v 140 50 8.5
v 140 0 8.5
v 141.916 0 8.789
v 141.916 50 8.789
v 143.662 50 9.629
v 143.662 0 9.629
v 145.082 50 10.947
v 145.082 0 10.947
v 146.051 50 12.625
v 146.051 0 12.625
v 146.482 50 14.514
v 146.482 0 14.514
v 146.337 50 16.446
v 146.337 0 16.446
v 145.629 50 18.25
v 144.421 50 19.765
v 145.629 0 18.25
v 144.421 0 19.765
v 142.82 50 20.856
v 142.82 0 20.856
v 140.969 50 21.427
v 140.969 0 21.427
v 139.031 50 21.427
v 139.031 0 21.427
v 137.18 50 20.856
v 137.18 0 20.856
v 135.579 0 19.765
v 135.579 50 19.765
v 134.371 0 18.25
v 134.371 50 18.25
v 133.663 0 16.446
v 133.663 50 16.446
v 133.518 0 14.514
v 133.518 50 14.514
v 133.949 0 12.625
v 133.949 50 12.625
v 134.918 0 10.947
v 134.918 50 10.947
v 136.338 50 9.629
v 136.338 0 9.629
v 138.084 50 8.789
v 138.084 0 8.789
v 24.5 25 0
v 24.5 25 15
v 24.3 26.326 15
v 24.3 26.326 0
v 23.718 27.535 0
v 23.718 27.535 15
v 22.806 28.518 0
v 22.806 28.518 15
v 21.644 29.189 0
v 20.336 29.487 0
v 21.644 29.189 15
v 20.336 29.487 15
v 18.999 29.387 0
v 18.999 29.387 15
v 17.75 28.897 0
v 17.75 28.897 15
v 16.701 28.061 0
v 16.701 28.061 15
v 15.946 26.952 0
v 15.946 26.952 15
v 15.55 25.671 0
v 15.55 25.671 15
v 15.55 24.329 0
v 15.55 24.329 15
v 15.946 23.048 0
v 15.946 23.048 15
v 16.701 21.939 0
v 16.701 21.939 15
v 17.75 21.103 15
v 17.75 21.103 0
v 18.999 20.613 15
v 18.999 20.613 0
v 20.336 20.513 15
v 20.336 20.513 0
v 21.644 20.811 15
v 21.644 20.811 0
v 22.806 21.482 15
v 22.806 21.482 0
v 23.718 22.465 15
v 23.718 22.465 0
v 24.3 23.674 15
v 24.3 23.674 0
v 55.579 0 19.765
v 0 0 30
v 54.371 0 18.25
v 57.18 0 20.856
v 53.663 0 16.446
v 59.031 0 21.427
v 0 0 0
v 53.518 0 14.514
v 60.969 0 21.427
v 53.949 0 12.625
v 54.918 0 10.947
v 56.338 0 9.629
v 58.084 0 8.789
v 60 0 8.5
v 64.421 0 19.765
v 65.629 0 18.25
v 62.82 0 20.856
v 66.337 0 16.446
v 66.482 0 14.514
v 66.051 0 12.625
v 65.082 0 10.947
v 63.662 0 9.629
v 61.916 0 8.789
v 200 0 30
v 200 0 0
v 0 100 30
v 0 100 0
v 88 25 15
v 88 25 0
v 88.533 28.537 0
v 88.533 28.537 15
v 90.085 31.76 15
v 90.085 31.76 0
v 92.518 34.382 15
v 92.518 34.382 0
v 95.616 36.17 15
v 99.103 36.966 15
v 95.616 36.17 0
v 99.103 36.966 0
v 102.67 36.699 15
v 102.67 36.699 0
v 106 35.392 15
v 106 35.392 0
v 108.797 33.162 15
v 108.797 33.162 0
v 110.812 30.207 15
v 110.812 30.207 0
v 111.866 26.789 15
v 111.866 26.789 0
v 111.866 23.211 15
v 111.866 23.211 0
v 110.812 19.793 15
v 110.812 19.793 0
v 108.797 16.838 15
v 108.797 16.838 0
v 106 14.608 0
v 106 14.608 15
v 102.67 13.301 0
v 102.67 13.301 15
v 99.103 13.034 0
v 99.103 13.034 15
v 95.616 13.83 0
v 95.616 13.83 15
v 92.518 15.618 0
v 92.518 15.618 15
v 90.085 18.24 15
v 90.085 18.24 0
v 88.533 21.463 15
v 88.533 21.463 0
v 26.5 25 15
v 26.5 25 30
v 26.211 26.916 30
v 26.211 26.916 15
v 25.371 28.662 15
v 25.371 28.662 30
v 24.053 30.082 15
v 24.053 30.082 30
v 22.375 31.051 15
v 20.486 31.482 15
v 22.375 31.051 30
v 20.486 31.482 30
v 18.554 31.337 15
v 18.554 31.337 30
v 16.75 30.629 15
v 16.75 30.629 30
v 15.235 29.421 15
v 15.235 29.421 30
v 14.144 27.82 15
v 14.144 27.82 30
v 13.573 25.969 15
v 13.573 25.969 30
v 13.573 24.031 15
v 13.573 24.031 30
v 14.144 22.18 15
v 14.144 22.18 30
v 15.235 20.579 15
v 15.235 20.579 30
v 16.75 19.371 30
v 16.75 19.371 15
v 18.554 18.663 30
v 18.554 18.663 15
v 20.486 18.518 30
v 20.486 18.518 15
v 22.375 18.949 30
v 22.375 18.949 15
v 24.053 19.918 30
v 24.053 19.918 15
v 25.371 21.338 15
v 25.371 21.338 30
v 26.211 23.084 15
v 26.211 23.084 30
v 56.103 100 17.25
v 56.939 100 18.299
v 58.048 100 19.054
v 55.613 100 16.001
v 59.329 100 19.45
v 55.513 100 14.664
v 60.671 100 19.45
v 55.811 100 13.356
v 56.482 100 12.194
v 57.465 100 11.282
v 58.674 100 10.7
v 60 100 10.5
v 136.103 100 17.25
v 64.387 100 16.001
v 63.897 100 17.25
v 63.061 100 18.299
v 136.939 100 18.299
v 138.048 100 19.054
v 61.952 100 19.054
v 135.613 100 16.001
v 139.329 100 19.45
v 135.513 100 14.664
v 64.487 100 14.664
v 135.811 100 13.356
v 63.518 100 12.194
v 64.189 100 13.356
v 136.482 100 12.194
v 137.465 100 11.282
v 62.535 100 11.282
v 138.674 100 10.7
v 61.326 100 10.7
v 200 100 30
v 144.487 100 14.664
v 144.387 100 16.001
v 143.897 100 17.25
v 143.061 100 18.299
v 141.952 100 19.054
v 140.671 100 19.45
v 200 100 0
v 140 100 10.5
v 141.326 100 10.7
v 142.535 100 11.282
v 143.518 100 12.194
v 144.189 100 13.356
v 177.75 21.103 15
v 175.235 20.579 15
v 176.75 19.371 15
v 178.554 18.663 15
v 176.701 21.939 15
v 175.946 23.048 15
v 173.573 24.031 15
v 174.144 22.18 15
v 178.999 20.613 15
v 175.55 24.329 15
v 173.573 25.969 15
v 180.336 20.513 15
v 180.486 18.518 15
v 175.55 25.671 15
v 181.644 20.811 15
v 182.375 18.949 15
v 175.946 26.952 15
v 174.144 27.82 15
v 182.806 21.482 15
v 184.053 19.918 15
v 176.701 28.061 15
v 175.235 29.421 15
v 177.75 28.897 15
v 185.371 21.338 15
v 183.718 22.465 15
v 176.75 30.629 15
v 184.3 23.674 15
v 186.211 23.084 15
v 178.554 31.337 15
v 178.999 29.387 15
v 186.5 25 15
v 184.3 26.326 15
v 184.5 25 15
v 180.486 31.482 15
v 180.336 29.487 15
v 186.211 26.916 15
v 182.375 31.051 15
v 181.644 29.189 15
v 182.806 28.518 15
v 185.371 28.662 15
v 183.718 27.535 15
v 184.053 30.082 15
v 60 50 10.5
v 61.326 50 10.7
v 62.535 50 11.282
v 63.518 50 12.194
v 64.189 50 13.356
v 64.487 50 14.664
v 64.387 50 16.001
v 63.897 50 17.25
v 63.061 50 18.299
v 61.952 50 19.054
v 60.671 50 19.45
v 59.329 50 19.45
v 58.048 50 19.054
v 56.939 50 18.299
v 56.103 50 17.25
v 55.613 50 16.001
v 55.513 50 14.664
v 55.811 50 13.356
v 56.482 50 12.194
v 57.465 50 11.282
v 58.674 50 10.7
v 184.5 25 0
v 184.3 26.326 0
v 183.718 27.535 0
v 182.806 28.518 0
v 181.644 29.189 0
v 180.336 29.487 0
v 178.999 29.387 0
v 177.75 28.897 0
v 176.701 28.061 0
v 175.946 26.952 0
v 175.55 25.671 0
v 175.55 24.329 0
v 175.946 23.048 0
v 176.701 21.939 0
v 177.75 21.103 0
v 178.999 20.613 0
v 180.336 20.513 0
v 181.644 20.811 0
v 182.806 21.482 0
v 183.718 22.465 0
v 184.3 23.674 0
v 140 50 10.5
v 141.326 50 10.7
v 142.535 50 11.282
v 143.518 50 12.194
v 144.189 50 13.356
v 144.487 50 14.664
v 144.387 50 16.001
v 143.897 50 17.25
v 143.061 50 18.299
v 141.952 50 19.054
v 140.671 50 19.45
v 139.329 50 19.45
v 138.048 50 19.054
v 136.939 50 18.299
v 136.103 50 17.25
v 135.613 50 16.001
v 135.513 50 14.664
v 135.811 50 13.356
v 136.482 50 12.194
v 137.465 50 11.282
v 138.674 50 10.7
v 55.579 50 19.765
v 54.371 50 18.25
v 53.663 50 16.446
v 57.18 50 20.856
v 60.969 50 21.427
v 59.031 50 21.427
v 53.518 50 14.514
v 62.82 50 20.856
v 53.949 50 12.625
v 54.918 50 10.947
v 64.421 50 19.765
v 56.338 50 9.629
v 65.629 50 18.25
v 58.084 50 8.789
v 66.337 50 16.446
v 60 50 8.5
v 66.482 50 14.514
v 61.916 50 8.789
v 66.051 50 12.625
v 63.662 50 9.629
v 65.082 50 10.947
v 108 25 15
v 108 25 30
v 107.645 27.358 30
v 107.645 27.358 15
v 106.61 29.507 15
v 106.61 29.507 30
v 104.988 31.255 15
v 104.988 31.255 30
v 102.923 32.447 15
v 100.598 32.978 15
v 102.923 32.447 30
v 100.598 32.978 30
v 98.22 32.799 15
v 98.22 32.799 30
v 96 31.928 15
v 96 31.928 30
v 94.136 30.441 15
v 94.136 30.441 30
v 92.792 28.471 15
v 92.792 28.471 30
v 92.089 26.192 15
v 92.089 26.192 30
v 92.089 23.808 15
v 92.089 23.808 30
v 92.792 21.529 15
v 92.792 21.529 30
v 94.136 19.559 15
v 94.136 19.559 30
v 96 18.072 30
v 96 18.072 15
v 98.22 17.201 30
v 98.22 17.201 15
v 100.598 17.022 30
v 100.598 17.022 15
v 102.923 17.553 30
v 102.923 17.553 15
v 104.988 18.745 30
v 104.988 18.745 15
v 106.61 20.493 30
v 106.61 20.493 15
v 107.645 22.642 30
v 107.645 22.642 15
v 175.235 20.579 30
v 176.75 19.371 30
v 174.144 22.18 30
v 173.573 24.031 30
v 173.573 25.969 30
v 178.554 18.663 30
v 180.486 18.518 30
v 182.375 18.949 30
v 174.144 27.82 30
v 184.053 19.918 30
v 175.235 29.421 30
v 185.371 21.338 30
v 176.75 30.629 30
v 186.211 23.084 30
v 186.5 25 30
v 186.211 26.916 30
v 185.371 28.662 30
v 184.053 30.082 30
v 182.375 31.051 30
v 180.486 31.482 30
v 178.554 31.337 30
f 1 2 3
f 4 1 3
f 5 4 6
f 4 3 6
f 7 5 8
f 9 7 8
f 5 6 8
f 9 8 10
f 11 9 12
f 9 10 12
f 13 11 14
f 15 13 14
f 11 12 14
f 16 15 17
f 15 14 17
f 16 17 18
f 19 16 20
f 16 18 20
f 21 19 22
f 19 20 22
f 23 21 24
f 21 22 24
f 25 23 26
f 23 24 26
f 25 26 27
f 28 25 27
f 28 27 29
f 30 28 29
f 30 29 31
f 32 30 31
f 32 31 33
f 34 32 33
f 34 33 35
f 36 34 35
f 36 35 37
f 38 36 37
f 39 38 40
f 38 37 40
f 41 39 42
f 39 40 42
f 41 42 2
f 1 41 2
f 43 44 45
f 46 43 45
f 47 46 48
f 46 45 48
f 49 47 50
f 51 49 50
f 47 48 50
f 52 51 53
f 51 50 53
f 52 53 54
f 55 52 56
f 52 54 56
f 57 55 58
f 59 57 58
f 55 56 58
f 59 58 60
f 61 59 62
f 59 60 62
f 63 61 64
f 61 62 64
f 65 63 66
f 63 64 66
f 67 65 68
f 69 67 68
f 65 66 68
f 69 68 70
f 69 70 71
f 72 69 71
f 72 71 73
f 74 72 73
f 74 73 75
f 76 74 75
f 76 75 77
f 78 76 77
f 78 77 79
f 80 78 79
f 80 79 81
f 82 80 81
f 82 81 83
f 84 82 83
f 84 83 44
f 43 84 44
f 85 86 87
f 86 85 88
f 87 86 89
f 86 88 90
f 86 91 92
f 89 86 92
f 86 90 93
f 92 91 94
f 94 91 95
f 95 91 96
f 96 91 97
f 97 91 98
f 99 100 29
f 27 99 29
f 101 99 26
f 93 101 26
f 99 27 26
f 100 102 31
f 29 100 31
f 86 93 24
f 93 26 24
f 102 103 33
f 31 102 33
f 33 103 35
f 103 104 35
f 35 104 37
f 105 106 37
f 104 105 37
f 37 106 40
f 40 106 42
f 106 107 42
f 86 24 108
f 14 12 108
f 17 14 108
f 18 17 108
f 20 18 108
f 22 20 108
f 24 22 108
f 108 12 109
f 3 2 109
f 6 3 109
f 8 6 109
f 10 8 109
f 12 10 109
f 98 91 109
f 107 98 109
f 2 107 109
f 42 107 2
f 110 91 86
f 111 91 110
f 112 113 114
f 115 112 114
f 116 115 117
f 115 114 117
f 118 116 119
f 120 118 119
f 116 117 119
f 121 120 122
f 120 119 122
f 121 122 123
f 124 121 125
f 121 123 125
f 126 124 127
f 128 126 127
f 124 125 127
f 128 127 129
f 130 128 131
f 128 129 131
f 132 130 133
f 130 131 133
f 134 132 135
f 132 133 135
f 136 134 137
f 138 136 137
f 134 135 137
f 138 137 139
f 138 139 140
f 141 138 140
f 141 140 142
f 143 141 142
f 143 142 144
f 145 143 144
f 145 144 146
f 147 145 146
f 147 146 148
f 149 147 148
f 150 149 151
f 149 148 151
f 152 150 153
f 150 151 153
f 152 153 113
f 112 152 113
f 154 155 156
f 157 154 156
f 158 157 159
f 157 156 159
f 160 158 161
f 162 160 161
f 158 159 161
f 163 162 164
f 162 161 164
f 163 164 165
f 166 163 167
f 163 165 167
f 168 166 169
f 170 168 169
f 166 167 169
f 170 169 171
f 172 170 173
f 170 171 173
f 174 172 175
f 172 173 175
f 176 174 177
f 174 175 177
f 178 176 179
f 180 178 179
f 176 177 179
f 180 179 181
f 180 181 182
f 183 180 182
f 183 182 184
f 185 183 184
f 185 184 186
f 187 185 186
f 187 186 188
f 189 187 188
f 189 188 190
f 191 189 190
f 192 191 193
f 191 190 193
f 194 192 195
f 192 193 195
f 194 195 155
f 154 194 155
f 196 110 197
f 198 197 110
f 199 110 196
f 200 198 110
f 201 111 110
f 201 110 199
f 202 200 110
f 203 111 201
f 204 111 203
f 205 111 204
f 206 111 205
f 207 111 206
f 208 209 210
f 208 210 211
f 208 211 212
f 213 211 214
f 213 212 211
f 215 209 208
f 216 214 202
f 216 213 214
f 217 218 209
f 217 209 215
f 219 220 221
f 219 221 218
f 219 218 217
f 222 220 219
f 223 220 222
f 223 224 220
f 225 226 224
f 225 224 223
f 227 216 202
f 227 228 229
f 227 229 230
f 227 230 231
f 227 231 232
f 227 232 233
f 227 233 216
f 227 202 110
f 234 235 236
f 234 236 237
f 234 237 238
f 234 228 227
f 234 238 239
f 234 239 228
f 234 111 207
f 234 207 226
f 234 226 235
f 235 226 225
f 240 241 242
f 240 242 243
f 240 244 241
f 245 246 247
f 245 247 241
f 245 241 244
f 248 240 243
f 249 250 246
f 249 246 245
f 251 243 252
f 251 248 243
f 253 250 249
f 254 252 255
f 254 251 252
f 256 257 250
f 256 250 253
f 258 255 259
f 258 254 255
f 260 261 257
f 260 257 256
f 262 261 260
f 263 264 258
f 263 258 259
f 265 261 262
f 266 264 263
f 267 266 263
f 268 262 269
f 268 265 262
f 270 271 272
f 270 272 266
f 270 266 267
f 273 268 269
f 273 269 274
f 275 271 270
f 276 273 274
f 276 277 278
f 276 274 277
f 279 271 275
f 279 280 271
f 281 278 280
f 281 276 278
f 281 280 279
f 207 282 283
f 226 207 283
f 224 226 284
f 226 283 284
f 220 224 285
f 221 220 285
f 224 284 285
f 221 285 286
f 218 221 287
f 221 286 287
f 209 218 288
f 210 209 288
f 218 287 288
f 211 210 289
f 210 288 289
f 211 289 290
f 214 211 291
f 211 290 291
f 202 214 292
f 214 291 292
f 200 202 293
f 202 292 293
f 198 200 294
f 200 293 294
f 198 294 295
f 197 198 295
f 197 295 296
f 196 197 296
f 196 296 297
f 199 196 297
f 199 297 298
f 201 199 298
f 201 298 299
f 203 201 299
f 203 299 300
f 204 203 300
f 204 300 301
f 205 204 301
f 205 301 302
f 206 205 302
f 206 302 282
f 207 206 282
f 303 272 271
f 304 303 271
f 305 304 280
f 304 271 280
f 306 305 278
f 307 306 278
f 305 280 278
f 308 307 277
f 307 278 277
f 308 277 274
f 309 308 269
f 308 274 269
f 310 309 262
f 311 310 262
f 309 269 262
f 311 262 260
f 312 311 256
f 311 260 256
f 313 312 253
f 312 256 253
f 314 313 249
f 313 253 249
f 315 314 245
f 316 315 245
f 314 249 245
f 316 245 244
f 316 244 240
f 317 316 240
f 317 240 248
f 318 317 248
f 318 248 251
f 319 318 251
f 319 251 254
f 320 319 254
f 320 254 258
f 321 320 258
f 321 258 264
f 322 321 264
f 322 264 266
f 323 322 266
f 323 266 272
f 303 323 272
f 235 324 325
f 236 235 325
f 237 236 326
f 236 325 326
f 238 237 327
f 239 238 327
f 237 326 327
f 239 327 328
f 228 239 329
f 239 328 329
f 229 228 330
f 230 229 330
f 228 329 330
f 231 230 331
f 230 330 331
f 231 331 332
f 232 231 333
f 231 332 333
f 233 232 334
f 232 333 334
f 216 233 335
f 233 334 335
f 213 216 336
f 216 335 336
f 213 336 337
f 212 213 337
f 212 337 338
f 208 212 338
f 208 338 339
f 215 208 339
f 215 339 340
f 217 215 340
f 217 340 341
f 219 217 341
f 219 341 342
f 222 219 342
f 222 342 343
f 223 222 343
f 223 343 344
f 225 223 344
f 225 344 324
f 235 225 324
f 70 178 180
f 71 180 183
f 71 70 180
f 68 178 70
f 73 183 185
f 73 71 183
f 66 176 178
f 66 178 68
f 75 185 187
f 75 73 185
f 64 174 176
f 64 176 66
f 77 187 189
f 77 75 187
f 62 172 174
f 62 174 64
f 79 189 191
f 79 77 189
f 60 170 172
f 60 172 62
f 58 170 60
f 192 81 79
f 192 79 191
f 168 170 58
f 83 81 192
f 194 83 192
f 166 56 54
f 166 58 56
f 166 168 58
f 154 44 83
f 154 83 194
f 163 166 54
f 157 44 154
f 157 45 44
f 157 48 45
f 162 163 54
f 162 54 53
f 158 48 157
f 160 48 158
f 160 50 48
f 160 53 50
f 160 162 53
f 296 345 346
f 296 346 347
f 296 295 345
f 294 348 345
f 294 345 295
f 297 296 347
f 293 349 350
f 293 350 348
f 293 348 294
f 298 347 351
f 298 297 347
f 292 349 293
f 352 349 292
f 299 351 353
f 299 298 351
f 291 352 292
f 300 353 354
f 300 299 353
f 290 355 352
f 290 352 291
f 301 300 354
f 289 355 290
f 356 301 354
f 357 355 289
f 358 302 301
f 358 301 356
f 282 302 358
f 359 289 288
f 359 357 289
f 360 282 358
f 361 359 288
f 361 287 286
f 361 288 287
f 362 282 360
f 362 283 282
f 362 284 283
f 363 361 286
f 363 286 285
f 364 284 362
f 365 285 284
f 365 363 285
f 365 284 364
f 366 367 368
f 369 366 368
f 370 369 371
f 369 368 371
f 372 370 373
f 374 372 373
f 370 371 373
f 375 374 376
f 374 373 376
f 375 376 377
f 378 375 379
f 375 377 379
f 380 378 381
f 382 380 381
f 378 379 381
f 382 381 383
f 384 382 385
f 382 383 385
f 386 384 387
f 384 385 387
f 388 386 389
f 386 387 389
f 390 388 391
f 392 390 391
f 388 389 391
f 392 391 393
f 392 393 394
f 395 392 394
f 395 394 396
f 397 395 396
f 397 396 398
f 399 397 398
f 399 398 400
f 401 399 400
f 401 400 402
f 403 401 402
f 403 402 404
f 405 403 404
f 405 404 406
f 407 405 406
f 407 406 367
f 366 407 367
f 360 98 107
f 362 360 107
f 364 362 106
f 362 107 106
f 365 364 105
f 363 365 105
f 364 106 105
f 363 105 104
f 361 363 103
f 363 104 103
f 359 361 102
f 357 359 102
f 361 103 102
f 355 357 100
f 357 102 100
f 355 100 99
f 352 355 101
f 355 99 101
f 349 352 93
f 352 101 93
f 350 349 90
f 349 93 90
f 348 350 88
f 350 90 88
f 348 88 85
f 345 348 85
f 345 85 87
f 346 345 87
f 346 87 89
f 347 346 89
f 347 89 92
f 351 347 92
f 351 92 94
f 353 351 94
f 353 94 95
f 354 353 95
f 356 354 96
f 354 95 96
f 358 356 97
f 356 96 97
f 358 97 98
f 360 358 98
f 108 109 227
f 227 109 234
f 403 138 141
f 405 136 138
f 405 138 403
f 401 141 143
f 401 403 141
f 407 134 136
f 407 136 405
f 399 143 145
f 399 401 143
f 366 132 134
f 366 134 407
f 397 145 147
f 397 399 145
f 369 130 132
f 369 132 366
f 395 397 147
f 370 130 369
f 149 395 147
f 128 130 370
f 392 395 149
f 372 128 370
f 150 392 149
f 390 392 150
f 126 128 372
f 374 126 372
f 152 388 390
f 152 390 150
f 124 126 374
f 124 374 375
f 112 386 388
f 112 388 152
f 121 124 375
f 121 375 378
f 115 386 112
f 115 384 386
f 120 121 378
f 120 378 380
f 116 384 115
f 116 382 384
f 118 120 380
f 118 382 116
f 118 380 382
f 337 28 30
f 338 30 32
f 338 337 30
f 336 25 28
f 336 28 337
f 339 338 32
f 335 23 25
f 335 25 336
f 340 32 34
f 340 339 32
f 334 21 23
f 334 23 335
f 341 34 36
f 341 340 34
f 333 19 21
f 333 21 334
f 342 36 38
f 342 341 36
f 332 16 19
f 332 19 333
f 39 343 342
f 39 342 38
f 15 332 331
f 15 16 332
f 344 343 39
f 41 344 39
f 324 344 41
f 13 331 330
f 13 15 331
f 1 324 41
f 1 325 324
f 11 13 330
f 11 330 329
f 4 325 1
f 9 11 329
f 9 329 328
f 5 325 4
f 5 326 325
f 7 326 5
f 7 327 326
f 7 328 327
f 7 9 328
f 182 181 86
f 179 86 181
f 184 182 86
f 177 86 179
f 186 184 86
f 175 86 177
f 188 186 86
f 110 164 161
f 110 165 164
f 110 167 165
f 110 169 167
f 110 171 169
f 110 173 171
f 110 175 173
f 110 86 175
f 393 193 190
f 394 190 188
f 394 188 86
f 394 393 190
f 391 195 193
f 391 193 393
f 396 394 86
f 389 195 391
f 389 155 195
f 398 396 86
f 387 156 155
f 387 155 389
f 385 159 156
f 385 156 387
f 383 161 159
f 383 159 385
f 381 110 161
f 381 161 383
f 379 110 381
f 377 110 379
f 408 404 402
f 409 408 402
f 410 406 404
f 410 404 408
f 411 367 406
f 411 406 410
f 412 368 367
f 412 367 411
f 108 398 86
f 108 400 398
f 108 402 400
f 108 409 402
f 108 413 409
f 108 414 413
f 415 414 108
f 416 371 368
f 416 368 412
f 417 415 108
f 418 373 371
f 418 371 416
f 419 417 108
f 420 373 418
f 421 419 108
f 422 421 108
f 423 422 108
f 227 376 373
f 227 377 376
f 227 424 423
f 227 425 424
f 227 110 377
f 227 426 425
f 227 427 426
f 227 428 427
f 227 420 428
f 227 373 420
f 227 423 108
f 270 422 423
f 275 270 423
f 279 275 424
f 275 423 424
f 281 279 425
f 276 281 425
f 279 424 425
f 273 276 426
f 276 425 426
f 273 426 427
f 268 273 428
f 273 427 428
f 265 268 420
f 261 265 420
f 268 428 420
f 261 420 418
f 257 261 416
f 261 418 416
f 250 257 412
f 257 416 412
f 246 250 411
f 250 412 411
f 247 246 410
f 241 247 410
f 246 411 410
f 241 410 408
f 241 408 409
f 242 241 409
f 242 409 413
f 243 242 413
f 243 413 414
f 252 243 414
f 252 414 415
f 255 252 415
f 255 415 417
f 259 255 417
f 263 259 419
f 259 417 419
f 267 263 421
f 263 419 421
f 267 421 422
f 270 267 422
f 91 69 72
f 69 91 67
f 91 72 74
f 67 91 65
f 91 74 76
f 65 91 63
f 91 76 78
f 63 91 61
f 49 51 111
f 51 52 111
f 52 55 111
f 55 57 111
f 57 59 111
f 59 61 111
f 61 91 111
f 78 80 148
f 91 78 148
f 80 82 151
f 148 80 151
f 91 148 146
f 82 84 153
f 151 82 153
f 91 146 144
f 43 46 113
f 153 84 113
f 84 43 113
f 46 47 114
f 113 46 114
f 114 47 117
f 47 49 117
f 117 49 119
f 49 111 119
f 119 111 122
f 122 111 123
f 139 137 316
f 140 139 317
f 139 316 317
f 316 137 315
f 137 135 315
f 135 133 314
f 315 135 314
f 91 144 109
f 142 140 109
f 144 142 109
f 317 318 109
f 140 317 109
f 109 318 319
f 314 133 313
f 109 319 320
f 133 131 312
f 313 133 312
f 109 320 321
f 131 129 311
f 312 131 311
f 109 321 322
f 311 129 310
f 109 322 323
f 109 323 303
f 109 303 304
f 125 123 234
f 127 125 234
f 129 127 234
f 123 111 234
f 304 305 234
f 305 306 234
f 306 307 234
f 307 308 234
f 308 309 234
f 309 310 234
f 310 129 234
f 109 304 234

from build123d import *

# Parameters (mm, degrees)
SKETCH_1_W          = 200
SKETCH_1_H          = 100
EXTRUDE_1_DEPTH     = 30
SKETCH_2_R          = 4.5
SKETCH_2_R_2        = 8
CUT_EXTRUDE_1_DEPTH = 226.610283454
SKETCH_3_R          = 4.5
CUT_EXTRUDE_2_DEPTH = 226.610283454
SKETCH_4_R          = 6.5
CUT_EXTRUDE_3_DEPTH = 50
SKETCH_5_R          = 6.5
CUT_EXTRUDE_4_DEPTH = 15
SKETCH_6_R          = 12
CUT_EXTRUDE_5_DEPTH = 15


with BuildPart() as part:
    # 草图1 → 凸台-拉伸1 (new body)
    with BuildSketch(Plane.XY):
        with Locations((100, 50)):
            Rectangle(SKETCH_1_W, SKETCH_1_H)
    extrude(amount=EXTRUDE_1_DEPTH)

    # 草图2 → 切除-拉伸1 (cut, through all)
    with BuildSketch(Plane.XY.offset(30)):
        with Locations((20, 25)):
            Circle(SKETCH_2_R)
        with Locations((100, 25)):
            Circle(SKETCH_2_R_2)
        with Locations((180, 25)):
            Circle(SKETCH_2_R)
    extrude(amount=-CUT_EXTRUDE_1_DEPTH, mode=Mode.SUBTRACT)

    # 草图3 → 切除-拉伸2 (cut, through all)
    with BuildSketch(Plane.XZ):
        with Locations(Location((60, 15, 0), (0, 0, 270))):
            Circle(SKETCH_3_R)
        with Locations(Location((140, 15, 0), (0, 0, 270))):
            Circle(SKETCH_3_R)
    extrude(amount=-CUT_EXTRUDE_2_DEPTH, mode=Mode.SUBTRACT)

    # 草图4 → 切除-拉伸3 (cut)
    with BuildSketch(Plane.XZ):
        with Locations(Location((60, 15, 0), (0, 0, 270))):
            Circle(SKETCH_4_R)
        with Locations(Location((140, 15, 0), (0, 0, 270))):
            Circle(SKETCH_4_R)
    extrude(amount=-CUT_EXTRUDE_3_DEPTH, mode=Mode.SUBTRACT)

    # 草图5 → 切除-拉伸4 (cut)
    with BuildSketch(Plane.XY.offset(30)):
        with Locations((20, 25)):
            Circle(SKETCH_5_R)
        with Locations((180, 25)):
            Circle(SKETCH_5_R)
    extrude(amount=-CUT_EXTRUDE_4_DEPTH, mode=Mode.SUBTRACT)

    # 草图6 → 切除-拉伸5 (cut)
    with BuildSketch(Plane(origin=(0, 0, 0), x_dir=(-1, 0, 0), z_dir=(0, 0, -1))):
        with Locations((-100, 25)):
            Circle(SKETCH_6_R)
    extrude(amount=-CUT_EXTRUDE_5_DEPTH, mode=Mode.SUBTRACT)


solid = part.part
